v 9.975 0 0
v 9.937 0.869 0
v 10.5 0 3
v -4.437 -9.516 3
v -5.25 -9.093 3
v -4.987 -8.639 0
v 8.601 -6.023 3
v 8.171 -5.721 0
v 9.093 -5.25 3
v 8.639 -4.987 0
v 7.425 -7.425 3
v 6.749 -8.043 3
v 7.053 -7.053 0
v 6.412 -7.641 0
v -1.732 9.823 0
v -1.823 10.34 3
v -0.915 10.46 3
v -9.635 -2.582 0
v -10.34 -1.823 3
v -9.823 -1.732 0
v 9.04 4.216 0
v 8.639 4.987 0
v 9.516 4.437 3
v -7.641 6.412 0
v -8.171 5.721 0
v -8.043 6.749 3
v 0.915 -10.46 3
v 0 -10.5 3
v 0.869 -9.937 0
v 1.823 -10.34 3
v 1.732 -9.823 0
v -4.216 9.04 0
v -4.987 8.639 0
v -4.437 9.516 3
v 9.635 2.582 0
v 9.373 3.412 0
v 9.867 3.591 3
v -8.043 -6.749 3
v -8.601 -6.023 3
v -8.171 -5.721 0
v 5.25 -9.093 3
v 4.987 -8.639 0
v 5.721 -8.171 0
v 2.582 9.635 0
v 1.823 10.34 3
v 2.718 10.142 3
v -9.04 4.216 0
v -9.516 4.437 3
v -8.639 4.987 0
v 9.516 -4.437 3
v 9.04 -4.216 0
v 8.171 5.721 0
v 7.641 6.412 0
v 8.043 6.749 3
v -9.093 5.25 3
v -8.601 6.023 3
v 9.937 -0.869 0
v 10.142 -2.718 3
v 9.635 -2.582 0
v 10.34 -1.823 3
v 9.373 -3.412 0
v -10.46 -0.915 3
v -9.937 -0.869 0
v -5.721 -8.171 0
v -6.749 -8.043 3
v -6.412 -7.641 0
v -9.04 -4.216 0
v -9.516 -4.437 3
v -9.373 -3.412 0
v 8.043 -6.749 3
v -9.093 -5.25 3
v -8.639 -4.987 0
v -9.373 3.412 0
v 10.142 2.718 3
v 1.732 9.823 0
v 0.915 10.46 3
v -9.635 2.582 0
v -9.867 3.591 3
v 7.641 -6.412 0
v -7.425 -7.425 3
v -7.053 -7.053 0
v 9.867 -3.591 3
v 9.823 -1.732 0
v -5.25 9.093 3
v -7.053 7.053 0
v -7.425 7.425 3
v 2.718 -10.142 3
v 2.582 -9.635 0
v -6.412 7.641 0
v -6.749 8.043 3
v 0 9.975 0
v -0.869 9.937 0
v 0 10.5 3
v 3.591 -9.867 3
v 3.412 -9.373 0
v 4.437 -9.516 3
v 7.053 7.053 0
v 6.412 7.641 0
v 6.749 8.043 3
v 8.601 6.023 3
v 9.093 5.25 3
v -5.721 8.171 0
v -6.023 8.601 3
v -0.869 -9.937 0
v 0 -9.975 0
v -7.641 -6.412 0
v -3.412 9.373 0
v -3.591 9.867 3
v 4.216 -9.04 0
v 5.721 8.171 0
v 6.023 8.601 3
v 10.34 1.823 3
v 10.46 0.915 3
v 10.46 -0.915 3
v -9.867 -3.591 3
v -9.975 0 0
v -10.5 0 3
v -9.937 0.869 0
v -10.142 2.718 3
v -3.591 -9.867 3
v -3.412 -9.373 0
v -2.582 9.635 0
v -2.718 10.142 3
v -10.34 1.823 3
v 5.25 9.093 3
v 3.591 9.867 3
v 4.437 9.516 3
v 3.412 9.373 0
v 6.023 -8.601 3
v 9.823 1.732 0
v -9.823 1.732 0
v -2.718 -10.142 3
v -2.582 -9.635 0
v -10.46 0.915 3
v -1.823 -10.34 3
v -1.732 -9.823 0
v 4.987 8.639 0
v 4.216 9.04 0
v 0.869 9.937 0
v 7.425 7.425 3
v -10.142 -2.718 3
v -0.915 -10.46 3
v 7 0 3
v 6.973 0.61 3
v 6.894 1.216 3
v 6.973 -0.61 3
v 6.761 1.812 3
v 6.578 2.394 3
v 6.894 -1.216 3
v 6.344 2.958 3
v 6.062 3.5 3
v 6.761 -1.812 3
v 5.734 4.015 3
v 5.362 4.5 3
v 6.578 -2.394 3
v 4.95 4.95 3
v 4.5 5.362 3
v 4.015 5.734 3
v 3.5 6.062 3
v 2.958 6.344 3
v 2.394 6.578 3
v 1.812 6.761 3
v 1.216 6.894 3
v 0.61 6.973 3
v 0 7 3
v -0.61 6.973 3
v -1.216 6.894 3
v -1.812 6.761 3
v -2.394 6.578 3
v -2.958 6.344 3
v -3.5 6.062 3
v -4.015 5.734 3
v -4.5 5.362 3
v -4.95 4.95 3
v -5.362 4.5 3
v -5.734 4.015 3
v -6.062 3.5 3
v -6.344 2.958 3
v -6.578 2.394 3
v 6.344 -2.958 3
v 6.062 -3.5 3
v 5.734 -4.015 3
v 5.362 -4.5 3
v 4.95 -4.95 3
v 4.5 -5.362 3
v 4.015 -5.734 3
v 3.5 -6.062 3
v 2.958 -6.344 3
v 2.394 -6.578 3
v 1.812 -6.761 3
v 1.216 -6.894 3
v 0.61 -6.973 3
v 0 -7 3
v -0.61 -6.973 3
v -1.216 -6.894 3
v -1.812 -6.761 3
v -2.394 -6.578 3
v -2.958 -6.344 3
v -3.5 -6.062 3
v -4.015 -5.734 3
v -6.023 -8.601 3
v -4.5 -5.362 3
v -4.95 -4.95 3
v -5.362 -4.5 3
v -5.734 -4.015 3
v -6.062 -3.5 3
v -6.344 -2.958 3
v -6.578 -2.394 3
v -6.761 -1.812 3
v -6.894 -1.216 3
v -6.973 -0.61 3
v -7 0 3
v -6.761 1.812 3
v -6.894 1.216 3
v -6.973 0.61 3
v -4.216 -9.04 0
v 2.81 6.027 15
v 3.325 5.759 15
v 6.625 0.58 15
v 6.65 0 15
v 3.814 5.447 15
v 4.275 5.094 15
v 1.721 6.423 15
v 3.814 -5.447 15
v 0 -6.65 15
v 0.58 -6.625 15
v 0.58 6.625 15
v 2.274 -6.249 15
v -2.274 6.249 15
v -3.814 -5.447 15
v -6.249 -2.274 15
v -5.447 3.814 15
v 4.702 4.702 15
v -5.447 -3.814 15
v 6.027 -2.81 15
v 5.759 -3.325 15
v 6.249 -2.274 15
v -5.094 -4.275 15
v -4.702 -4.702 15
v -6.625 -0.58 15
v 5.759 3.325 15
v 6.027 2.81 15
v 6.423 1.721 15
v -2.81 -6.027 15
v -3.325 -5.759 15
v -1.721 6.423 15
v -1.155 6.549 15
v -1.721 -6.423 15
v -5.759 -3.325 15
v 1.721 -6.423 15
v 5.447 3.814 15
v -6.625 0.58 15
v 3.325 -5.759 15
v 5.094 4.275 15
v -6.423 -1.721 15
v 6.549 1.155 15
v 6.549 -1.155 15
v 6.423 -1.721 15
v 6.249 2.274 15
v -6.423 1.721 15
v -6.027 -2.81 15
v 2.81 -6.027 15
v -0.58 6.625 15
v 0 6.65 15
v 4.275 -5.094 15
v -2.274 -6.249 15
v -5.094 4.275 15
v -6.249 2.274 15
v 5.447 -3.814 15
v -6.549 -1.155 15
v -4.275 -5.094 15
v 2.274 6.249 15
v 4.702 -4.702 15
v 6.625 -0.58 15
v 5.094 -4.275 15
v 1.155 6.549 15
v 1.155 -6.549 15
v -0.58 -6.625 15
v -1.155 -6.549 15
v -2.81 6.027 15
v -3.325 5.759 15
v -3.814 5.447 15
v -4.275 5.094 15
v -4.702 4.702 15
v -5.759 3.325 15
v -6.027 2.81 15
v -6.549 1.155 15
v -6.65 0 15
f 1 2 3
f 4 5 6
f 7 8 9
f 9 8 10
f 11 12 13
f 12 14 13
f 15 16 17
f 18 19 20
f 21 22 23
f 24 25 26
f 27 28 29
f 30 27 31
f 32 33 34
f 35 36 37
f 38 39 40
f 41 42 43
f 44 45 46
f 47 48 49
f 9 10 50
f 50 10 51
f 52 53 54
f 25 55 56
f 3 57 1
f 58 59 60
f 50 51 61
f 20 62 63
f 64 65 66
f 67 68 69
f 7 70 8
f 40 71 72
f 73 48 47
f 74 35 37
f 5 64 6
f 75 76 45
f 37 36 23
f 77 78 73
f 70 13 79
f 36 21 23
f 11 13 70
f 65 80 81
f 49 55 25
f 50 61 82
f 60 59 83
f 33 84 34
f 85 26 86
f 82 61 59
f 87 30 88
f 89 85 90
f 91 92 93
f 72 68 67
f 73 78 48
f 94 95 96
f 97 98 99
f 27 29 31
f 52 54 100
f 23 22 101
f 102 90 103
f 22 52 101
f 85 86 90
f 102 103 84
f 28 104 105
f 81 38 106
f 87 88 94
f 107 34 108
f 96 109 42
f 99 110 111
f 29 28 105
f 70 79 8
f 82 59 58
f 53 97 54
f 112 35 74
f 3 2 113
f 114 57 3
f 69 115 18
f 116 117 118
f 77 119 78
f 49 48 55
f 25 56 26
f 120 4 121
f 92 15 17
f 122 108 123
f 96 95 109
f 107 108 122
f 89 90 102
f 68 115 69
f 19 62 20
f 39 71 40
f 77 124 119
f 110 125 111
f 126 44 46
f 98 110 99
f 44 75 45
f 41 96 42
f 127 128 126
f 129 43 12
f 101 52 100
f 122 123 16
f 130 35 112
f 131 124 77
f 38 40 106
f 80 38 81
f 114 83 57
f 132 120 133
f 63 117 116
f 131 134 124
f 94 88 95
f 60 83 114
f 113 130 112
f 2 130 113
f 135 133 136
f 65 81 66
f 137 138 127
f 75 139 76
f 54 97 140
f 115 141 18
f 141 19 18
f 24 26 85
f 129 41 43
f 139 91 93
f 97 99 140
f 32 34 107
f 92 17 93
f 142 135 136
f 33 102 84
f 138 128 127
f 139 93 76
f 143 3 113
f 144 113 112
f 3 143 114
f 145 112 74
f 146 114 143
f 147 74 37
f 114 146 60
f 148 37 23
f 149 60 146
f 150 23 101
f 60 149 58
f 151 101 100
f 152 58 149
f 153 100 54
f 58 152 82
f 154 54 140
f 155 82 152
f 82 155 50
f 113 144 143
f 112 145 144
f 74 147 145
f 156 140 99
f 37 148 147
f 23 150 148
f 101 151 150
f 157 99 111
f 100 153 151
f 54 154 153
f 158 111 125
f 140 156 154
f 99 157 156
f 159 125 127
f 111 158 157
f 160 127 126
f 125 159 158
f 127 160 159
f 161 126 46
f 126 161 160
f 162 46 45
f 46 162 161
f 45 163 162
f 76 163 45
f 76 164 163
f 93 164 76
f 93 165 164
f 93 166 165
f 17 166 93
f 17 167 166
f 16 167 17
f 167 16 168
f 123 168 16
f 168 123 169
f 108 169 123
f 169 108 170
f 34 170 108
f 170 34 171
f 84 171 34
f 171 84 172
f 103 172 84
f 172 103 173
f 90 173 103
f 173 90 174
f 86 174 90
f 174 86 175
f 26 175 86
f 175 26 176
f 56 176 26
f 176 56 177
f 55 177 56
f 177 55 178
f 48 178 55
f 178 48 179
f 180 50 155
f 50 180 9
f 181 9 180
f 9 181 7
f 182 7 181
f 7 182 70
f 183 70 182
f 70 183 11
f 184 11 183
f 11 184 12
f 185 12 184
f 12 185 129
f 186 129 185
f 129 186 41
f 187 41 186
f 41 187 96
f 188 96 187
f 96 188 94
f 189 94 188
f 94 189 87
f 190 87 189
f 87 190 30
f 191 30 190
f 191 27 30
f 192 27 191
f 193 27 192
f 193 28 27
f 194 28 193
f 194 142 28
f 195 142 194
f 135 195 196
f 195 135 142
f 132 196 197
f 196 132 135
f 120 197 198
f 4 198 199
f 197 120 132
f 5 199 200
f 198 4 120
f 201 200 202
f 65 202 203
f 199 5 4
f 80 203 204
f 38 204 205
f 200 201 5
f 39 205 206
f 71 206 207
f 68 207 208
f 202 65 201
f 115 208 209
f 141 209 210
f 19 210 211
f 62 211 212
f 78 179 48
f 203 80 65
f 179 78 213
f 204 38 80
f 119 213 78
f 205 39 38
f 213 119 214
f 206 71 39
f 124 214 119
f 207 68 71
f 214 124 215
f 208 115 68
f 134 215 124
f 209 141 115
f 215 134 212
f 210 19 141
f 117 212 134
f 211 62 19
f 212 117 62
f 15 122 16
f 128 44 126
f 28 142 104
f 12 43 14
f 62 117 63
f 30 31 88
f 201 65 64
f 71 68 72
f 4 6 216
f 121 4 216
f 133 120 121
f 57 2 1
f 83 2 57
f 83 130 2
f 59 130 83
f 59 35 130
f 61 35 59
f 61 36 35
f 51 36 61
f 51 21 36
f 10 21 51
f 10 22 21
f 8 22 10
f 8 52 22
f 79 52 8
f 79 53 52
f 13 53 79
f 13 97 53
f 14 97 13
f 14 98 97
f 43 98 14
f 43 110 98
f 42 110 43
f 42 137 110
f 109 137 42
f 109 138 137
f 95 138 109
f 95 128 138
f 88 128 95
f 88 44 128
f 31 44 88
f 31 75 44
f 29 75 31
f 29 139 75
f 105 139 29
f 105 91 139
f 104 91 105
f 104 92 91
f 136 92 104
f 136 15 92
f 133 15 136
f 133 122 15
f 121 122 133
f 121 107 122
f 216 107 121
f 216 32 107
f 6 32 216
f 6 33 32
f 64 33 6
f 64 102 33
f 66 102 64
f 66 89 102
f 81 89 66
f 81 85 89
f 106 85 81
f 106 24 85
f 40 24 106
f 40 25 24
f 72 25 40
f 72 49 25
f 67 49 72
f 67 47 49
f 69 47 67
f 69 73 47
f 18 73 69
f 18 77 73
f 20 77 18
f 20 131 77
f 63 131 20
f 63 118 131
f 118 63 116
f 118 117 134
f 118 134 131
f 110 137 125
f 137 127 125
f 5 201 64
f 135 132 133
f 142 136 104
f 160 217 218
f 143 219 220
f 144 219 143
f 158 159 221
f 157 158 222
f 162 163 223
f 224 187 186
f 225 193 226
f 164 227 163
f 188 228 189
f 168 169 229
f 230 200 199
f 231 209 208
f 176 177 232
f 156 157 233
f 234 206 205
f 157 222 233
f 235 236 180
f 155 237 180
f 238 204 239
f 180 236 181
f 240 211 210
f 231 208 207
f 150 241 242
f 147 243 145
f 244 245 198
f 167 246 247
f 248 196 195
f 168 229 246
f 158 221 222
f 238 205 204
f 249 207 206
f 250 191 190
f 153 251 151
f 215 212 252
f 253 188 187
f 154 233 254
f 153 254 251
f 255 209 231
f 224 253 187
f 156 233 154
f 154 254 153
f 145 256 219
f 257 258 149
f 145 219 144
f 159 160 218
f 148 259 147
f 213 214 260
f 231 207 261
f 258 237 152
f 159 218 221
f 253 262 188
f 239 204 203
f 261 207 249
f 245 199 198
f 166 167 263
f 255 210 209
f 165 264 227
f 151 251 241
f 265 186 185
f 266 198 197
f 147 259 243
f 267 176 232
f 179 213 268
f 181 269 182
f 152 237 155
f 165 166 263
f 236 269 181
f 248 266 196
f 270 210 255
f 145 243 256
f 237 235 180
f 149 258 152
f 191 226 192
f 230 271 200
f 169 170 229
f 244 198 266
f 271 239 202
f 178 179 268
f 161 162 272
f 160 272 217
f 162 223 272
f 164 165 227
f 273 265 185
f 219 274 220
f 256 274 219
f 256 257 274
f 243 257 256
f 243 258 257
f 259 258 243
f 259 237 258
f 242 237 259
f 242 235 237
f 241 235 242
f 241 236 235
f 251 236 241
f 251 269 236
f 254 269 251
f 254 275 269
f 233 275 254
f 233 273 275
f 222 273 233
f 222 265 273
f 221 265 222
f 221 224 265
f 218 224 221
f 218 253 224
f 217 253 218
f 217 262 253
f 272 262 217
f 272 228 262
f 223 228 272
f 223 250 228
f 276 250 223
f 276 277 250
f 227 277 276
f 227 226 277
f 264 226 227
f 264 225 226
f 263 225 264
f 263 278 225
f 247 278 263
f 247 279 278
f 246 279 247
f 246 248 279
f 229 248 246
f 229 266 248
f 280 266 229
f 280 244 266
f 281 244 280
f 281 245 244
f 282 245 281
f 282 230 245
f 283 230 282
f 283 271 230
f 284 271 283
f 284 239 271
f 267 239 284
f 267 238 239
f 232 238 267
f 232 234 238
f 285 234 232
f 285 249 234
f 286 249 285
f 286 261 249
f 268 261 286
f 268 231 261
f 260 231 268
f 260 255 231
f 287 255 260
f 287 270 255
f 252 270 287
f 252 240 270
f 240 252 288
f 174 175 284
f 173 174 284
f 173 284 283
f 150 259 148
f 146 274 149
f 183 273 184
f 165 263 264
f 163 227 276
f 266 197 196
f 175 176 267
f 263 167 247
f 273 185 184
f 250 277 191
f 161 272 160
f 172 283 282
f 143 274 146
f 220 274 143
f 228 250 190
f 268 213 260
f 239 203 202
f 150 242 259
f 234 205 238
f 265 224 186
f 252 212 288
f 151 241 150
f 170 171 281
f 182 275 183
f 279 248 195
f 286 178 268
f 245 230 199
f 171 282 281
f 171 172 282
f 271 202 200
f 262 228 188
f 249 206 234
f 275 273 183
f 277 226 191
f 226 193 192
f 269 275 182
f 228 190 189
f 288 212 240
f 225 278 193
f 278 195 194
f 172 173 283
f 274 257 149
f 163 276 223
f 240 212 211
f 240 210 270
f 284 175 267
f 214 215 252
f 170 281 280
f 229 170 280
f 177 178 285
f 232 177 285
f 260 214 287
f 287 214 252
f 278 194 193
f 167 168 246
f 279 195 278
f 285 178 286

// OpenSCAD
//14//21//3
$fn=72;
h=3;
d1=14;
d2=21;

cylinder(h=h, d1=d2*0.95, d2=d2);
translate([0,0,h])
cylinder(h=h*4, d1=d1, d2=d1*0.95);
